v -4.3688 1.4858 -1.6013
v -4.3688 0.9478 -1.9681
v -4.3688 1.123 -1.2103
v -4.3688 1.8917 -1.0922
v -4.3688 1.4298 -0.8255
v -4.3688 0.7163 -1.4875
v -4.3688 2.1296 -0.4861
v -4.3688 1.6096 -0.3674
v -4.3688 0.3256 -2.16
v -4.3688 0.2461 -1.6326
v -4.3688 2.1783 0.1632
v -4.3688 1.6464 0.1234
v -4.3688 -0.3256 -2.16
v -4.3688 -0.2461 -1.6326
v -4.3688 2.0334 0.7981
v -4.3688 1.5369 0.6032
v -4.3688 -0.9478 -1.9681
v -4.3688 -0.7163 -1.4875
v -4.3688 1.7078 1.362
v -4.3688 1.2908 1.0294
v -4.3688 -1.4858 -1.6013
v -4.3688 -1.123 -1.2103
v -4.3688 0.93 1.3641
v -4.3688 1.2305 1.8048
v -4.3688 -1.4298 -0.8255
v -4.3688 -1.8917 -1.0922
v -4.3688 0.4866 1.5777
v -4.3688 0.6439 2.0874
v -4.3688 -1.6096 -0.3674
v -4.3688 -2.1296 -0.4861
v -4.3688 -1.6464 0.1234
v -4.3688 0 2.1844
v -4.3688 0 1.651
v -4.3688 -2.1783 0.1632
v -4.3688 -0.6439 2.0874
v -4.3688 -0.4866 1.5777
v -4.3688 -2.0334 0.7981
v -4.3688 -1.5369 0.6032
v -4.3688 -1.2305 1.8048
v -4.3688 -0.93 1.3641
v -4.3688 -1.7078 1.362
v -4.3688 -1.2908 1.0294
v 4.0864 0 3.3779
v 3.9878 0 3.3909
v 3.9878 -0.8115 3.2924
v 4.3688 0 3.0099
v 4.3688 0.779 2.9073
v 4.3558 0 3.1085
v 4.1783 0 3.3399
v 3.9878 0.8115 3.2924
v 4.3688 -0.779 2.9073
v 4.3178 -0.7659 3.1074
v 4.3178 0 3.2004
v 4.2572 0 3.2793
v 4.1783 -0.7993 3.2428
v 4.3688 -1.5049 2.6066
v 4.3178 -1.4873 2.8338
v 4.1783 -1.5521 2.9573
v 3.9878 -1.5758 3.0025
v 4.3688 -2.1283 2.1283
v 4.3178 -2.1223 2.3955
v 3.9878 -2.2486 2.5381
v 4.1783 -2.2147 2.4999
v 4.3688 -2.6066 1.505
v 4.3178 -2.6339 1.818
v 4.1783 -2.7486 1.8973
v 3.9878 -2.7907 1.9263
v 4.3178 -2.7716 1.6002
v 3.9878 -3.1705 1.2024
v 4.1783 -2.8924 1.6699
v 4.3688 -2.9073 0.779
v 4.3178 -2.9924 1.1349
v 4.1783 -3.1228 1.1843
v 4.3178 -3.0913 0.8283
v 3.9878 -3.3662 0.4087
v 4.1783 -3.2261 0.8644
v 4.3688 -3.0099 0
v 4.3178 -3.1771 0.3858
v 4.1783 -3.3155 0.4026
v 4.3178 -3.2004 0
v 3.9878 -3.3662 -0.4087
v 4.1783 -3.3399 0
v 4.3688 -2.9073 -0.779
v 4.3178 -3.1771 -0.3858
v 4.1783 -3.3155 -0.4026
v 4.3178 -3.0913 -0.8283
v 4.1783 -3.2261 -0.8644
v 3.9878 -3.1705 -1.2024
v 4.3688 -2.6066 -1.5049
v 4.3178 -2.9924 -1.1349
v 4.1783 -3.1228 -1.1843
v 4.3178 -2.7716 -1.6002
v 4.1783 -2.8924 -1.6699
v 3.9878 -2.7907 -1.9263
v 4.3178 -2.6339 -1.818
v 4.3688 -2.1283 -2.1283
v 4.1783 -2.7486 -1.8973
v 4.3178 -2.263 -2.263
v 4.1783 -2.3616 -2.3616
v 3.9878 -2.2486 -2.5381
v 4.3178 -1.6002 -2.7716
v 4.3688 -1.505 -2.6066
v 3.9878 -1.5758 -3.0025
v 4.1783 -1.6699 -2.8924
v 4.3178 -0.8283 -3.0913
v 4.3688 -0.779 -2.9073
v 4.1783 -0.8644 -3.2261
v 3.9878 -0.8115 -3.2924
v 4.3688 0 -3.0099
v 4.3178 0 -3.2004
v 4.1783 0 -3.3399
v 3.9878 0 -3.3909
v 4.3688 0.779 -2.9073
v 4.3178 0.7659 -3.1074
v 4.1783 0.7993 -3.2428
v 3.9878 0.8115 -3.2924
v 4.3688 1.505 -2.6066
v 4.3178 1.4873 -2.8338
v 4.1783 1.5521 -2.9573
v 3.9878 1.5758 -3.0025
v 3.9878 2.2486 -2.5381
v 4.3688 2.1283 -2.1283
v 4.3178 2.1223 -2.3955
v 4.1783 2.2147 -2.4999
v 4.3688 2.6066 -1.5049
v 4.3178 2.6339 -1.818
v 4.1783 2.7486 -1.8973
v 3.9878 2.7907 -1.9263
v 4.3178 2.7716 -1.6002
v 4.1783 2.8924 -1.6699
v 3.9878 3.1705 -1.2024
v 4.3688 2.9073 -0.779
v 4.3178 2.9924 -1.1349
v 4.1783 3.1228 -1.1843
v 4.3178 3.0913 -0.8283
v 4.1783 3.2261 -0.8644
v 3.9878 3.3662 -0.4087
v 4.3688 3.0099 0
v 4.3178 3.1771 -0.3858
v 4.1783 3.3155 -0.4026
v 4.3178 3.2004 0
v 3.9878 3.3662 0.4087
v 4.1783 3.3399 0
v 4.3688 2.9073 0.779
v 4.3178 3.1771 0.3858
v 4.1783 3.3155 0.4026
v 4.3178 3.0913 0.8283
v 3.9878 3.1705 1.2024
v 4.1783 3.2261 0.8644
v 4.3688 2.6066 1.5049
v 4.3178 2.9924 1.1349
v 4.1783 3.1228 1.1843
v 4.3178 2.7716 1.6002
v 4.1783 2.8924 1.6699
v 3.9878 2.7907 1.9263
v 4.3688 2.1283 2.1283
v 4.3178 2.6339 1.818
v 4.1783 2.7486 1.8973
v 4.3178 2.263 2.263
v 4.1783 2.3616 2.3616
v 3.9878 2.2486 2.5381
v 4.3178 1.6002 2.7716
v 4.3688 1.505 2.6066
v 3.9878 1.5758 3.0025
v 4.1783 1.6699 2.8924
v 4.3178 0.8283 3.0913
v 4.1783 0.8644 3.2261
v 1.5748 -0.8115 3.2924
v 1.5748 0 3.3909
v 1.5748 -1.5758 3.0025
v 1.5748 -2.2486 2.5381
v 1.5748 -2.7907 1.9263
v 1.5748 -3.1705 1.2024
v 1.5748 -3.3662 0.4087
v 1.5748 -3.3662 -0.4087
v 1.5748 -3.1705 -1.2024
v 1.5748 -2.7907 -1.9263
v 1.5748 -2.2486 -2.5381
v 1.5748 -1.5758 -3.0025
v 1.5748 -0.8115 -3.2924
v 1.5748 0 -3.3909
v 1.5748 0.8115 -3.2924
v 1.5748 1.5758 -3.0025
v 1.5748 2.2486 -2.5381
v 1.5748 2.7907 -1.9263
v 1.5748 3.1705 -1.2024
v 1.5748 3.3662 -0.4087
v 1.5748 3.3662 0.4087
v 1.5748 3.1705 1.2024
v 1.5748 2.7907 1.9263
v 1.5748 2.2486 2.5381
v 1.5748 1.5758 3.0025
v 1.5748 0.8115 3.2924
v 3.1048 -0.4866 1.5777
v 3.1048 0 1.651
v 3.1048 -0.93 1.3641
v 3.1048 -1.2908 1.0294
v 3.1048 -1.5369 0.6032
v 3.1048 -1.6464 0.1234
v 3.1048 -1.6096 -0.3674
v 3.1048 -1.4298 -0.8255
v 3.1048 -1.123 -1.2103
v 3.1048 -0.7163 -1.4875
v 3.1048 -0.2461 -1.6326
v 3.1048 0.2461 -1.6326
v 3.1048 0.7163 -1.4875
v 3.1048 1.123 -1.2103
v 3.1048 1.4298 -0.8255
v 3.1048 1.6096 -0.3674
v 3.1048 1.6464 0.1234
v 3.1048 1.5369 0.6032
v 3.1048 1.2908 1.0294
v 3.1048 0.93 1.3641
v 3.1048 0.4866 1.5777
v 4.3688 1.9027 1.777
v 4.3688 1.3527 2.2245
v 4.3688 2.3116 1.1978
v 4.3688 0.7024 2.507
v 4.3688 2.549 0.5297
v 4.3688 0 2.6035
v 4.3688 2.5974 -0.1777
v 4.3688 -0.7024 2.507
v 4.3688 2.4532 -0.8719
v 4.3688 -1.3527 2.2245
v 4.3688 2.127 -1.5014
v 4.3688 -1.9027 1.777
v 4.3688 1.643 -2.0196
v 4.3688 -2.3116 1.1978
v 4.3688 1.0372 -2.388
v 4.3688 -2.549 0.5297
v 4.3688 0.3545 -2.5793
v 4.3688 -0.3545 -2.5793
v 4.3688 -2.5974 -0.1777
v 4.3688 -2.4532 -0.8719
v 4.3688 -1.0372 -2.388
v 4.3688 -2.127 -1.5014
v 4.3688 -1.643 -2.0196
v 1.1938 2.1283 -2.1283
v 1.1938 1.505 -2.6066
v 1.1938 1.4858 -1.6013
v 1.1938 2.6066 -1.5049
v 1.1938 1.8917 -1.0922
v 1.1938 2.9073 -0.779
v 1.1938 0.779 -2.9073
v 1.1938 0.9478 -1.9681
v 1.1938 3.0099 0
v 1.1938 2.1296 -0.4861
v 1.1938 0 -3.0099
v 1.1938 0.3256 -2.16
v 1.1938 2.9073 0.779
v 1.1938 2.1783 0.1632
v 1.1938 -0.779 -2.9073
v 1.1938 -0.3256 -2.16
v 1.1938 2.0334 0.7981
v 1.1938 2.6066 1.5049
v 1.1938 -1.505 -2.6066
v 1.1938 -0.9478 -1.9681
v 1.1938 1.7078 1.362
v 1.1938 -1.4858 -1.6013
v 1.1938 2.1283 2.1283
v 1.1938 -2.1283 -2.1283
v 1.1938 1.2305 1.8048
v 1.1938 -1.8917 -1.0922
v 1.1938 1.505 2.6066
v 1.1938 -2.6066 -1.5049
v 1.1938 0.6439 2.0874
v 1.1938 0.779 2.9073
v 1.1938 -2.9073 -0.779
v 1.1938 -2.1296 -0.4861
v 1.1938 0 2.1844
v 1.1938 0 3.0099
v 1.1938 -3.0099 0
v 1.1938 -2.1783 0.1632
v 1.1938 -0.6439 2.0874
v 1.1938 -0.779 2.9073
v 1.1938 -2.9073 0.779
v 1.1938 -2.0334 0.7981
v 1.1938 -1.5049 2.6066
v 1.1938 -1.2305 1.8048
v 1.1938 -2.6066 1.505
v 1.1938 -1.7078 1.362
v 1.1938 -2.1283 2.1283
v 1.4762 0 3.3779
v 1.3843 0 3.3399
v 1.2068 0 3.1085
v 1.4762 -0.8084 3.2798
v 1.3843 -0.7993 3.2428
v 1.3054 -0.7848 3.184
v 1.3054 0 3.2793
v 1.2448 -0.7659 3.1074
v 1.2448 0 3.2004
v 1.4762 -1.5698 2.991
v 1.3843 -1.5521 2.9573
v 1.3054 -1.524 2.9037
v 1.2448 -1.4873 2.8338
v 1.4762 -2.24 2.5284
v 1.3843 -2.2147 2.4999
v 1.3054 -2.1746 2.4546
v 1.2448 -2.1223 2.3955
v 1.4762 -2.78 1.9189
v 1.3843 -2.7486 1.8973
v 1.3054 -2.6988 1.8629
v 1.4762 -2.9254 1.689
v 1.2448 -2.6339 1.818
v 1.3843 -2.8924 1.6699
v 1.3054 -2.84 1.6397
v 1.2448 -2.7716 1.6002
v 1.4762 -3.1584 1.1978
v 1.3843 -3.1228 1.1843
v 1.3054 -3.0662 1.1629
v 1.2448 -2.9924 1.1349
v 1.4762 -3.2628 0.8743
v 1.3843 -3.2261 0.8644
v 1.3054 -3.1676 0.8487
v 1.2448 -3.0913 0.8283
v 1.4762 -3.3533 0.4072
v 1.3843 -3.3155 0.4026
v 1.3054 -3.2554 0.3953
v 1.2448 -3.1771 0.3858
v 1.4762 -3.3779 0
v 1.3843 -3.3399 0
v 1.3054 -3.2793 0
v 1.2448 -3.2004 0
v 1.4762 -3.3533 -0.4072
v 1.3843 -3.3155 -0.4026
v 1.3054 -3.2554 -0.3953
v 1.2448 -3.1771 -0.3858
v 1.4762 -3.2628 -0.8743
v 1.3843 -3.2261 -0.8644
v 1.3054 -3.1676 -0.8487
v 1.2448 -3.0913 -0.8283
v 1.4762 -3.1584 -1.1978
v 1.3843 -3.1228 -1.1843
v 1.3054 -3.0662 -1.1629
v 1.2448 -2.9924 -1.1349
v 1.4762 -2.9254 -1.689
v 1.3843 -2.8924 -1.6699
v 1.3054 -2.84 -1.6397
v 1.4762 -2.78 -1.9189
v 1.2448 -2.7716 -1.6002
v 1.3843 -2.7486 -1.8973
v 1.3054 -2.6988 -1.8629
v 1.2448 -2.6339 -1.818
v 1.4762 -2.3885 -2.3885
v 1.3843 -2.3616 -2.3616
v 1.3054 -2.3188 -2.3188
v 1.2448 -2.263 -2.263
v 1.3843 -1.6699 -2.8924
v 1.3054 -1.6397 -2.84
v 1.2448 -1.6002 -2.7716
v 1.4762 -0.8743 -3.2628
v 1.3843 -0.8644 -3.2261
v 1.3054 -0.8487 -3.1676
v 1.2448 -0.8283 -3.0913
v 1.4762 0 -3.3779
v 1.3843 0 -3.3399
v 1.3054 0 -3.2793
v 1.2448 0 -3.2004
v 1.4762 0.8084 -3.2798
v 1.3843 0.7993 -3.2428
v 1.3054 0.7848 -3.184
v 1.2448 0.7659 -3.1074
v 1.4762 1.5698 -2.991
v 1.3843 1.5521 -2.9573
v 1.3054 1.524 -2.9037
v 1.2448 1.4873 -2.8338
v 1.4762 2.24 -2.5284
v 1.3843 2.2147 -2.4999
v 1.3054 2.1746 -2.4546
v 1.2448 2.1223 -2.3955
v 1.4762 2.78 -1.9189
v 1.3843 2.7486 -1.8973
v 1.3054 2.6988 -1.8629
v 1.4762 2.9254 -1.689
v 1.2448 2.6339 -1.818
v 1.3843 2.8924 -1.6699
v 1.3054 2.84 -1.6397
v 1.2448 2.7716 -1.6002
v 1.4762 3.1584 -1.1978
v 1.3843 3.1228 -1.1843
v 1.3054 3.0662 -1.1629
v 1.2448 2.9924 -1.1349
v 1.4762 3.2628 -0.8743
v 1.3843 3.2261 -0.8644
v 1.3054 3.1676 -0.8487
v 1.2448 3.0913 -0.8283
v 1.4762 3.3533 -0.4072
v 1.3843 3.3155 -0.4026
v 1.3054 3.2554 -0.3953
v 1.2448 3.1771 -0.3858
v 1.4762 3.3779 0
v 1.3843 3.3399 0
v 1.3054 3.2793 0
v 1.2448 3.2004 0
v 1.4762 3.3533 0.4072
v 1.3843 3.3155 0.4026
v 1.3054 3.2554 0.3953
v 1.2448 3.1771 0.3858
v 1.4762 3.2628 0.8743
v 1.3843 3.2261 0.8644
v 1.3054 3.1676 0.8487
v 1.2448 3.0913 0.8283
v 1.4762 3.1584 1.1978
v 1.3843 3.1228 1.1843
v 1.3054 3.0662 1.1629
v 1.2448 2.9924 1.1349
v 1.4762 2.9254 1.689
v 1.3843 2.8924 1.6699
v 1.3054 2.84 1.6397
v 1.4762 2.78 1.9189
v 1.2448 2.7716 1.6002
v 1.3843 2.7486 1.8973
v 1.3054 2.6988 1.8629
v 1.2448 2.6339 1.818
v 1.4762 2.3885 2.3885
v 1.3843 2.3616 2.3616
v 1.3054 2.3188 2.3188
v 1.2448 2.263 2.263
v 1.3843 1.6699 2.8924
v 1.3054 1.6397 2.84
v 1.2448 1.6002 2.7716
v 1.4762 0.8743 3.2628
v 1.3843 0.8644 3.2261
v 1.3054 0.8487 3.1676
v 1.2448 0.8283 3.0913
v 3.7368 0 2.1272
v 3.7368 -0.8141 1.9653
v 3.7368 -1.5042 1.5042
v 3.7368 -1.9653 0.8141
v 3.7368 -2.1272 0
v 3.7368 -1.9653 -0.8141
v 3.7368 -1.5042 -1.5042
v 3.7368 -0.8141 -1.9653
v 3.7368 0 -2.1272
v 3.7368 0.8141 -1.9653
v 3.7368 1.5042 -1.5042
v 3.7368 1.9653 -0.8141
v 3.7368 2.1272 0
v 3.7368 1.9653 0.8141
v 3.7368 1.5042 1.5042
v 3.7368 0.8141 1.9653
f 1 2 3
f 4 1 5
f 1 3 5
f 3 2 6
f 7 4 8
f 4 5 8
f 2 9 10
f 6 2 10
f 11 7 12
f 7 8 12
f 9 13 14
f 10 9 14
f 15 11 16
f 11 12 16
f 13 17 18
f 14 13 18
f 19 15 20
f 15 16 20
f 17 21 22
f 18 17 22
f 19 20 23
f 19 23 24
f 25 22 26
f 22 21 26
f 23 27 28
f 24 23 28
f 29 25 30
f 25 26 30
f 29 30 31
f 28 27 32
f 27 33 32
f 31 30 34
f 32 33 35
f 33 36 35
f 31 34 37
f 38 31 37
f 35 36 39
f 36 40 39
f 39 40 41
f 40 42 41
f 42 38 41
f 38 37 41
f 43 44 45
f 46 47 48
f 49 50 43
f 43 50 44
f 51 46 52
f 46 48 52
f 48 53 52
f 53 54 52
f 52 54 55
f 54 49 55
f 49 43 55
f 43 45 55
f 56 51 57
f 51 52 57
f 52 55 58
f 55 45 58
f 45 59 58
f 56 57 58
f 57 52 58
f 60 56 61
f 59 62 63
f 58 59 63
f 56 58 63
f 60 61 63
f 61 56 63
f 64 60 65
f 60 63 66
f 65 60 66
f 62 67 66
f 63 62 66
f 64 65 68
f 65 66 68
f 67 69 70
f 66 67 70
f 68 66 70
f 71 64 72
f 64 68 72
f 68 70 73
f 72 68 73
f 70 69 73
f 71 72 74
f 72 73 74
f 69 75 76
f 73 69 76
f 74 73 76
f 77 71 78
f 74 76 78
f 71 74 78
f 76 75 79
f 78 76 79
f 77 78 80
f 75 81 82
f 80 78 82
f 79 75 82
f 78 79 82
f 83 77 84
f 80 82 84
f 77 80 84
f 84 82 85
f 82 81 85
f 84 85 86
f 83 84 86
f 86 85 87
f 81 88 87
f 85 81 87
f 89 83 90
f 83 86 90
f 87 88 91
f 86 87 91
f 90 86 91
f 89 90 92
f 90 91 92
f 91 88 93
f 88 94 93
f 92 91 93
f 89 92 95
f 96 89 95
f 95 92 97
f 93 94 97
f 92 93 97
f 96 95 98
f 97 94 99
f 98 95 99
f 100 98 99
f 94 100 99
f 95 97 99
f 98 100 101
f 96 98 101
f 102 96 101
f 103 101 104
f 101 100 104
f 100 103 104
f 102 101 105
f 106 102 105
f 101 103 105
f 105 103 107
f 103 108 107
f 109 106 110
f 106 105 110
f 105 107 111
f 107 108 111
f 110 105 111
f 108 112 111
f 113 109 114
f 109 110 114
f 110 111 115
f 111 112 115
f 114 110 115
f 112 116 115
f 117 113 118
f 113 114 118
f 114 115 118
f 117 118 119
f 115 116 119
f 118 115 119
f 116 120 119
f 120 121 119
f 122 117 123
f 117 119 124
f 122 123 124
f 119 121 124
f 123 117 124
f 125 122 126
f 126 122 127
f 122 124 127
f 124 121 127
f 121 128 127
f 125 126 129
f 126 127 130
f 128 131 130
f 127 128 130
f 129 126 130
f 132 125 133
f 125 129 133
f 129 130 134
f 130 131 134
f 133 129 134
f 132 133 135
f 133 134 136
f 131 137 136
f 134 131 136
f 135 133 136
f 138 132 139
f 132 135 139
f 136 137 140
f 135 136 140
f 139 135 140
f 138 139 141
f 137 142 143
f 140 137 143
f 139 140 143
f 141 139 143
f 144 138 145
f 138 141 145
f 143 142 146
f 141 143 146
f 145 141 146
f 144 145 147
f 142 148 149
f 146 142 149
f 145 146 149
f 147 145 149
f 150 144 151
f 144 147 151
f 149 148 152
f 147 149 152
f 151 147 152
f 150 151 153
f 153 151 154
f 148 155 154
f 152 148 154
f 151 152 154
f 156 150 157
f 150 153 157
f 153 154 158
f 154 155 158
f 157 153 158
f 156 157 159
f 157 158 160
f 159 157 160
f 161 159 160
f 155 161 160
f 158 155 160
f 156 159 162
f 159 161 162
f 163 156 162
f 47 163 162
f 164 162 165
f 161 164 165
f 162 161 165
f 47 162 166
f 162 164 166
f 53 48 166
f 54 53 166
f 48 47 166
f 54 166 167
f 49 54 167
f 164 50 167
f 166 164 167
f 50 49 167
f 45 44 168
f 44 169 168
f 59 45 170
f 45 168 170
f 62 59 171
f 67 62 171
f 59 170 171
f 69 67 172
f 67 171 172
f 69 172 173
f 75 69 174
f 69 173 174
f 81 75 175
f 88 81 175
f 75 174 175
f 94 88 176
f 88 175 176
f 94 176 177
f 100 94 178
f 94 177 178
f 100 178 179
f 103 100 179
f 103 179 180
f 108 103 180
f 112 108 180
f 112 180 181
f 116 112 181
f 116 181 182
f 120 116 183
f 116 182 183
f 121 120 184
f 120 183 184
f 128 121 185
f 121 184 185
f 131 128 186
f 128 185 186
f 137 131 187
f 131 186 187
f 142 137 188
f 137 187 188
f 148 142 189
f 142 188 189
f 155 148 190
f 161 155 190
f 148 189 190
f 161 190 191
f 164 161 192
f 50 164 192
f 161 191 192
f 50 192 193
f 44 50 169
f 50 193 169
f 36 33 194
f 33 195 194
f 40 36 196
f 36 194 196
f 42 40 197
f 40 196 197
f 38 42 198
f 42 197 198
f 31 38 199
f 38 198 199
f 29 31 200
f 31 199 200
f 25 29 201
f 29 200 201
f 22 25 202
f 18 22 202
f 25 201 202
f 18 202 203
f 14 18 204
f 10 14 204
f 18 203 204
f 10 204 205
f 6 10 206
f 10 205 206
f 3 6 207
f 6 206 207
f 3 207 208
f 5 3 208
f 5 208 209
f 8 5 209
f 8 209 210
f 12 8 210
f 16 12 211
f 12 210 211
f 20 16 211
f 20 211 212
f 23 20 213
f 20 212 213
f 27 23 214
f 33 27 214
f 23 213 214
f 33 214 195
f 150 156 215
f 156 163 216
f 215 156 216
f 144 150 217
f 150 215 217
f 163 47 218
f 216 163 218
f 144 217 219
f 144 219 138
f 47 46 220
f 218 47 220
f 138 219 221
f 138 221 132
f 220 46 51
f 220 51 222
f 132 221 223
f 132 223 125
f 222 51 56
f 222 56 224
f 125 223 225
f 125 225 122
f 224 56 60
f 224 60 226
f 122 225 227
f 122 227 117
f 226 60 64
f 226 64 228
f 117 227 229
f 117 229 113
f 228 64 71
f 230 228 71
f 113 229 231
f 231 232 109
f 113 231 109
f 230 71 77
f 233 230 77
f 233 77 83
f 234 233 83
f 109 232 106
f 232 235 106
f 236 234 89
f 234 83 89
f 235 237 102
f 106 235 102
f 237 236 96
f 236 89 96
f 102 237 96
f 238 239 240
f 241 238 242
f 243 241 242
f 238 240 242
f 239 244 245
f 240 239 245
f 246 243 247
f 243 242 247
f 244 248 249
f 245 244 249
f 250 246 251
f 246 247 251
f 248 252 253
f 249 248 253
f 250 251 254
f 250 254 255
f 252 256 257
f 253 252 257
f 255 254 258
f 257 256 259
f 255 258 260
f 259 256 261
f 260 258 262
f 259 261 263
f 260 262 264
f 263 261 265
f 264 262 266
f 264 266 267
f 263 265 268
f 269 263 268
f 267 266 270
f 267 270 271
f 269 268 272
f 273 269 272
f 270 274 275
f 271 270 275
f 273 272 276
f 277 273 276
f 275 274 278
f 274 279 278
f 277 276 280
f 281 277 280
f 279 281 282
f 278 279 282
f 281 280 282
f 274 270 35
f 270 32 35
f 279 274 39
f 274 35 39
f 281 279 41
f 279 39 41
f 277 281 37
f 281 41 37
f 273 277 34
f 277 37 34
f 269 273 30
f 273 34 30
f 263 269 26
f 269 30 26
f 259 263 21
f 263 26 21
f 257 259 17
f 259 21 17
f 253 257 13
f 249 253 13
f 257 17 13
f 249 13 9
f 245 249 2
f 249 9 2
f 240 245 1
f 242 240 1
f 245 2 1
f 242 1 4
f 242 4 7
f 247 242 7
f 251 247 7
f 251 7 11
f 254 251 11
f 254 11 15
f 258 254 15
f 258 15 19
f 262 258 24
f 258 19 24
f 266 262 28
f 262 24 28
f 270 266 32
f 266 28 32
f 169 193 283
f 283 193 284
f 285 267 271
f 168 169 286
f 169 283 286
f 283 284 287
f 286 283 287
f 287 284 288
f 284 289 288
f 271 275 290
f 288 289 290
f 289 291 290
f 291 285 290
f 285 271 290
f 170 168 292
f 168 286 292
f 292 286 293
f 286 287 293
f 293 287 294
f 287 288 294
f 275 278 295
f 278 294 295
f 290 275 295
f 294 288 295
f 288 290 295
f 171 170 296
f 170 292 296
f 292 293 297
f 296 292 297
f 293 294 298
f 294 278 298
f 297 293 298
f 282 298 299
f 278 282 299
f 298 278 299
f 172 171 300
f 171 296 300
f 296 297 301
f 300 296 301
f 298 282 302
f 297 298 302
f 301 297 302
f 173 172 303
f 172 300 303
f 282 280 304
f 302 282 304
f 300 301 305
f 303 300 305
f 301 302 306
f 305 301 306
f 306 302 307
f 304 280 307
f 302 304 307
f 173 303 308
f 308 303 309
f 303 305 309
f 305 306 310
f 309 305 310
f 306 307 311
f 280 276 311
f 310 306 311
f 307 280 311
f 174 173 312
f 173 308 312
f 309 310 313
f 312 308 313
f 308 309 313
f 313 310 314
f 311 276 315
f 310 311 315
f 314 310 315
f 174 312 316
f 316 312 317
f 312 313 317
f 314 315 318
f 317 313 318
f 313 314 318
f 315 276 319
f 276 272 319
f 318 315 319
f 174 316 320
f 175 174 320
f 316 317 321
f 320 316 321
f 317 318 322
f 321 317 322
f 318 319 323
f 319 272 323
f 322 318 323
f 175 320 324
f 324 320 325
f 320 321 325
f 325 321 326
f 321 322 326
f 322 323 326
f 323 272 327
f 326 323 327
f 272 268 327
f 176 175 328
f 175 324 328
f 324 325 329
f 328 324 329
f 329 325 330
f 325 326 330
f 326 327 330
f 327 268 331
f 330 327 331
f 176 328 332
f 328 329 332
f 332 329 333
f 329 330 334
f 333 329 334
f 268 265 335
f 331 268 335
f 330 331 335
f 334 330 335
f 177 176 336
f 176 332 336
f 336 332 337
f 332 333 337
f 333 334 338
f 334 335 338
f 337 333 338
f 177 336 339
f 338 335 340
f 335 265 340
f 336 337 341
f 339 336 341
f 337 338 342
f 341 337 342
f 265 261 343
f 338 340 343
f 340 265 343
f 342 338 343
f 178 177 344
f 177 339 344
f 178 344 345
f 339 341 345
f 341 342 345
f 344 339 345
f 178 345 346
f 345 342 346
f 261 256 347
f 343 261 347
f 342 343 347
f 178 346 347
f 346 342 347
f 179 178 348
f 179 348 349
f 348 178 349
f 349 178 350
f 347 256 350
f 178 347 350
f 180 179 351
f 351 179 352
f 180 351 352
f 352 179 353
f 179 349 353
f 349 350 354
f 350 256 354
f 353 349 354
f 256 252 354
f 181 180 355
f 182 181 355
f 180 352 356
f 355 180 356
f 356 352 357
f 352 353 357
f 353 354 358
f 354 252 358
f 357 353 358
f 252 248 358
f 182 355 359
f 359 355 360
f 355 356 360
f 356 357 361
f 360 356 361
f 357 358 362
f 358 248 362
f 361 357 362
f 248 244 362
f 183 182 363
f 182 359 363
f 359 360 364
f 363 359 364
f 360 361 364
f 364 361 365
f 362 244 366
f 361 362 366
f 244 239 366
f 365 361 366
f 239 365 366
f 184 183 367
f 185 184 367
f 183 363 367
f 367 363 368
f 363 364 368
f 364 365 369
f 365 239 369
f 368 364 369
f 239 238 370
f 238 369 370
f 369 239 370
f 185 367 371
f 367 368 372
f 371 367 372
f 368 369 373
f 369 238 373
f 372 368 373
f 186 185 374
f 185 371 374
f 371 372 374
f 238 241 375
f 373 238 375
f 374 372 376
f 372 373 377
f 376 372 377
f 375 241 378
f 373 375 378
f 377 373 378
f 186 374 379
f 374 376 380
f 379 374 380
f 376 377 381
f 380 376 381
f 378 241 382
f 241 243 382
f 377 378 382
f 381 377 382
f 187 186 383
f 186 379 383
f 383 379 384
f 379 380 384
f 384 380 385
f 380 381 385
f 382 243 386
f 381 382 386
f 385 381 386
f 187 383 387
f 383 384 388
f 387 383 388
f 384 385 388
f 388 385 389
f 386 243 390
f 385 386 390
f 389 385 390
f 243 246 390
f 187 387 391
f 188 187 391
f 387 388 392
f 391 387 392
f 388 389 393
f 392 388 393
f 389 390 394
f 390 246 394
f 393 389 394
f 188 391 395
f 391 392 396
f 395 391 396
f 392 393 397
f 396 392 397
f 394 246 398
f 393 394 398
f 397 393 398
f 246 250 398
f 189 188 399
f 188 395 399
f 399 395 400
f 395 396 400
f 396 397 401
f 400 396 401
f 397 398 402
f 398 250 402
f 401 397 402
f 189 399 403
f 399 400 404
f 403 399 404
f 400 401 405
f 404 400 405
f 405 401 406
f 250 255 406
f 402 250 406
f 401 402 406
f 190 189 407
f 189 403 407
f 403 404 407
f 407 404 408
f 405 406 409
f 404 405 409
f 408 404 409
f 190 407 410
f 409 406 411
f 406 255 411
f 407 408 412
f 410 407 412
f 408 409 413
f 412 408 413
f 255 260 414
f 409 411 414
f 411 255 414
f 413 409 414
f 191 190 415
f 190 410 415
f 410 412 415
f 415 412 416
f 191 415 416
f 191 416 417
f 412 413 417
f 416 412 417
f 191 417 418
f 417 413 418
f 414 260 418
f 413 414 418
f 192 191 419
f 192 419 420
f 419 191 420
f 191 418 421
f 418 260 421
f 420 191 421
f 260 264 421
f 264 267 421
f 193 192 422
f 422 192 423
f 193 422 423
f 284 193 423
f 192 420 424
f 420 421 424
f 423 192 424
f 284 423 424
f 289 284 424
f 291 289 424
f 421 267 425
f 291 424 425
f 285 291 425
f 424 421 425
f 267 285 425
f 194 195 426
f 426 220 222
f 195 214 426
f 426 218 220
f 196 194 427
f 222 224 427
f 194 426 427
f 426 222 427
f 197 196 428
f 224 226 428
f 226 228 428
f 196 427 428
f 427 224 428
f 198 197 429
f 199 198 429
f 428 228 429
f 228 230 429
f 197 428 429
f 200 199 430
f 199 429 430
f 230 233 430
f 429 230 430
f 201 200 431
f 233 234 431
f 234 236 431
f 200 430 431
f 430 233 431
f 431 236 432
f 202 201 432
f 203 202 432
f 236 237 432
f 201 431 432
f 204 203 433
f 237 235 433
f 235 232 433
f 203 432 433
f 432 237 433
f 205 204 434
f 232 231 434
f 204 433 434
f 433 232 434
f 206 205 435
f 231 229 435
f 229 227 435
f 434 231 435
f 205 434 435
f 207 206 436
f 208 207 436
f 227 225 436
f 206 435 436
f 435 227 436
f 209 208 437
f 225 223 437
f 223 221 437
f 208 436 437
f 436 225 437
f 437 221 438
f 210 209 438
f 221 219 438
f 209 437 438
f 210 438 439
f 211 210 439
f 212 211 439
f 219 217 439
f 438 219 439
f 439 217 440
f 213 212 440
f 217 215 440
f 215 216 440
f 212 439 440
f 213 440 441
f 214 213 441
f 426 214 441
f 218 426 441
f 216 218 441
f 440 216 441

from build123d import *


with BuildPart() as part:
    # Sketch1 → Revolve1 (revolve)
    with BuildSketch(Plane.XY, mode=Mode.PRIVATE) as revolve1_sk:
        with BuildLine():
            Line((-4.3688, 1.651), (3.104789807, 1.651))
            Line((3.104789807, 1.651), (4.3688, 2.6035))
            Line((4.3688, 2.6035), (4.3688, 3.0099))
            ThreePointArc((4.3688, 3.0099), (4.257207684, 3.279307684), (3.9878, 3.3909))
            Line((3.9878, 3.3909), (1.5748, 3.3909))
            ThreePointArc((1.5748, 3.3909), (1.305392316, 3.279307684), (1.1938, 3.0099))
            Line((1.1938, 3.0099), (1.1938, 2.1844))
            Line((1.1938, 2.1844), (-4.3688, 2.1844))
            Line((-4.3688, 2.1844), (-4.3688, 1.651))
        make_face()
    revolve(revolve1_sk.sketch.rotate(Axis((-4.3688, 0, 0), (1, 0, 0)), 90), axis=Axis((-4.3688, 0, 0), (1, 0, 0)))


solid = part.part
